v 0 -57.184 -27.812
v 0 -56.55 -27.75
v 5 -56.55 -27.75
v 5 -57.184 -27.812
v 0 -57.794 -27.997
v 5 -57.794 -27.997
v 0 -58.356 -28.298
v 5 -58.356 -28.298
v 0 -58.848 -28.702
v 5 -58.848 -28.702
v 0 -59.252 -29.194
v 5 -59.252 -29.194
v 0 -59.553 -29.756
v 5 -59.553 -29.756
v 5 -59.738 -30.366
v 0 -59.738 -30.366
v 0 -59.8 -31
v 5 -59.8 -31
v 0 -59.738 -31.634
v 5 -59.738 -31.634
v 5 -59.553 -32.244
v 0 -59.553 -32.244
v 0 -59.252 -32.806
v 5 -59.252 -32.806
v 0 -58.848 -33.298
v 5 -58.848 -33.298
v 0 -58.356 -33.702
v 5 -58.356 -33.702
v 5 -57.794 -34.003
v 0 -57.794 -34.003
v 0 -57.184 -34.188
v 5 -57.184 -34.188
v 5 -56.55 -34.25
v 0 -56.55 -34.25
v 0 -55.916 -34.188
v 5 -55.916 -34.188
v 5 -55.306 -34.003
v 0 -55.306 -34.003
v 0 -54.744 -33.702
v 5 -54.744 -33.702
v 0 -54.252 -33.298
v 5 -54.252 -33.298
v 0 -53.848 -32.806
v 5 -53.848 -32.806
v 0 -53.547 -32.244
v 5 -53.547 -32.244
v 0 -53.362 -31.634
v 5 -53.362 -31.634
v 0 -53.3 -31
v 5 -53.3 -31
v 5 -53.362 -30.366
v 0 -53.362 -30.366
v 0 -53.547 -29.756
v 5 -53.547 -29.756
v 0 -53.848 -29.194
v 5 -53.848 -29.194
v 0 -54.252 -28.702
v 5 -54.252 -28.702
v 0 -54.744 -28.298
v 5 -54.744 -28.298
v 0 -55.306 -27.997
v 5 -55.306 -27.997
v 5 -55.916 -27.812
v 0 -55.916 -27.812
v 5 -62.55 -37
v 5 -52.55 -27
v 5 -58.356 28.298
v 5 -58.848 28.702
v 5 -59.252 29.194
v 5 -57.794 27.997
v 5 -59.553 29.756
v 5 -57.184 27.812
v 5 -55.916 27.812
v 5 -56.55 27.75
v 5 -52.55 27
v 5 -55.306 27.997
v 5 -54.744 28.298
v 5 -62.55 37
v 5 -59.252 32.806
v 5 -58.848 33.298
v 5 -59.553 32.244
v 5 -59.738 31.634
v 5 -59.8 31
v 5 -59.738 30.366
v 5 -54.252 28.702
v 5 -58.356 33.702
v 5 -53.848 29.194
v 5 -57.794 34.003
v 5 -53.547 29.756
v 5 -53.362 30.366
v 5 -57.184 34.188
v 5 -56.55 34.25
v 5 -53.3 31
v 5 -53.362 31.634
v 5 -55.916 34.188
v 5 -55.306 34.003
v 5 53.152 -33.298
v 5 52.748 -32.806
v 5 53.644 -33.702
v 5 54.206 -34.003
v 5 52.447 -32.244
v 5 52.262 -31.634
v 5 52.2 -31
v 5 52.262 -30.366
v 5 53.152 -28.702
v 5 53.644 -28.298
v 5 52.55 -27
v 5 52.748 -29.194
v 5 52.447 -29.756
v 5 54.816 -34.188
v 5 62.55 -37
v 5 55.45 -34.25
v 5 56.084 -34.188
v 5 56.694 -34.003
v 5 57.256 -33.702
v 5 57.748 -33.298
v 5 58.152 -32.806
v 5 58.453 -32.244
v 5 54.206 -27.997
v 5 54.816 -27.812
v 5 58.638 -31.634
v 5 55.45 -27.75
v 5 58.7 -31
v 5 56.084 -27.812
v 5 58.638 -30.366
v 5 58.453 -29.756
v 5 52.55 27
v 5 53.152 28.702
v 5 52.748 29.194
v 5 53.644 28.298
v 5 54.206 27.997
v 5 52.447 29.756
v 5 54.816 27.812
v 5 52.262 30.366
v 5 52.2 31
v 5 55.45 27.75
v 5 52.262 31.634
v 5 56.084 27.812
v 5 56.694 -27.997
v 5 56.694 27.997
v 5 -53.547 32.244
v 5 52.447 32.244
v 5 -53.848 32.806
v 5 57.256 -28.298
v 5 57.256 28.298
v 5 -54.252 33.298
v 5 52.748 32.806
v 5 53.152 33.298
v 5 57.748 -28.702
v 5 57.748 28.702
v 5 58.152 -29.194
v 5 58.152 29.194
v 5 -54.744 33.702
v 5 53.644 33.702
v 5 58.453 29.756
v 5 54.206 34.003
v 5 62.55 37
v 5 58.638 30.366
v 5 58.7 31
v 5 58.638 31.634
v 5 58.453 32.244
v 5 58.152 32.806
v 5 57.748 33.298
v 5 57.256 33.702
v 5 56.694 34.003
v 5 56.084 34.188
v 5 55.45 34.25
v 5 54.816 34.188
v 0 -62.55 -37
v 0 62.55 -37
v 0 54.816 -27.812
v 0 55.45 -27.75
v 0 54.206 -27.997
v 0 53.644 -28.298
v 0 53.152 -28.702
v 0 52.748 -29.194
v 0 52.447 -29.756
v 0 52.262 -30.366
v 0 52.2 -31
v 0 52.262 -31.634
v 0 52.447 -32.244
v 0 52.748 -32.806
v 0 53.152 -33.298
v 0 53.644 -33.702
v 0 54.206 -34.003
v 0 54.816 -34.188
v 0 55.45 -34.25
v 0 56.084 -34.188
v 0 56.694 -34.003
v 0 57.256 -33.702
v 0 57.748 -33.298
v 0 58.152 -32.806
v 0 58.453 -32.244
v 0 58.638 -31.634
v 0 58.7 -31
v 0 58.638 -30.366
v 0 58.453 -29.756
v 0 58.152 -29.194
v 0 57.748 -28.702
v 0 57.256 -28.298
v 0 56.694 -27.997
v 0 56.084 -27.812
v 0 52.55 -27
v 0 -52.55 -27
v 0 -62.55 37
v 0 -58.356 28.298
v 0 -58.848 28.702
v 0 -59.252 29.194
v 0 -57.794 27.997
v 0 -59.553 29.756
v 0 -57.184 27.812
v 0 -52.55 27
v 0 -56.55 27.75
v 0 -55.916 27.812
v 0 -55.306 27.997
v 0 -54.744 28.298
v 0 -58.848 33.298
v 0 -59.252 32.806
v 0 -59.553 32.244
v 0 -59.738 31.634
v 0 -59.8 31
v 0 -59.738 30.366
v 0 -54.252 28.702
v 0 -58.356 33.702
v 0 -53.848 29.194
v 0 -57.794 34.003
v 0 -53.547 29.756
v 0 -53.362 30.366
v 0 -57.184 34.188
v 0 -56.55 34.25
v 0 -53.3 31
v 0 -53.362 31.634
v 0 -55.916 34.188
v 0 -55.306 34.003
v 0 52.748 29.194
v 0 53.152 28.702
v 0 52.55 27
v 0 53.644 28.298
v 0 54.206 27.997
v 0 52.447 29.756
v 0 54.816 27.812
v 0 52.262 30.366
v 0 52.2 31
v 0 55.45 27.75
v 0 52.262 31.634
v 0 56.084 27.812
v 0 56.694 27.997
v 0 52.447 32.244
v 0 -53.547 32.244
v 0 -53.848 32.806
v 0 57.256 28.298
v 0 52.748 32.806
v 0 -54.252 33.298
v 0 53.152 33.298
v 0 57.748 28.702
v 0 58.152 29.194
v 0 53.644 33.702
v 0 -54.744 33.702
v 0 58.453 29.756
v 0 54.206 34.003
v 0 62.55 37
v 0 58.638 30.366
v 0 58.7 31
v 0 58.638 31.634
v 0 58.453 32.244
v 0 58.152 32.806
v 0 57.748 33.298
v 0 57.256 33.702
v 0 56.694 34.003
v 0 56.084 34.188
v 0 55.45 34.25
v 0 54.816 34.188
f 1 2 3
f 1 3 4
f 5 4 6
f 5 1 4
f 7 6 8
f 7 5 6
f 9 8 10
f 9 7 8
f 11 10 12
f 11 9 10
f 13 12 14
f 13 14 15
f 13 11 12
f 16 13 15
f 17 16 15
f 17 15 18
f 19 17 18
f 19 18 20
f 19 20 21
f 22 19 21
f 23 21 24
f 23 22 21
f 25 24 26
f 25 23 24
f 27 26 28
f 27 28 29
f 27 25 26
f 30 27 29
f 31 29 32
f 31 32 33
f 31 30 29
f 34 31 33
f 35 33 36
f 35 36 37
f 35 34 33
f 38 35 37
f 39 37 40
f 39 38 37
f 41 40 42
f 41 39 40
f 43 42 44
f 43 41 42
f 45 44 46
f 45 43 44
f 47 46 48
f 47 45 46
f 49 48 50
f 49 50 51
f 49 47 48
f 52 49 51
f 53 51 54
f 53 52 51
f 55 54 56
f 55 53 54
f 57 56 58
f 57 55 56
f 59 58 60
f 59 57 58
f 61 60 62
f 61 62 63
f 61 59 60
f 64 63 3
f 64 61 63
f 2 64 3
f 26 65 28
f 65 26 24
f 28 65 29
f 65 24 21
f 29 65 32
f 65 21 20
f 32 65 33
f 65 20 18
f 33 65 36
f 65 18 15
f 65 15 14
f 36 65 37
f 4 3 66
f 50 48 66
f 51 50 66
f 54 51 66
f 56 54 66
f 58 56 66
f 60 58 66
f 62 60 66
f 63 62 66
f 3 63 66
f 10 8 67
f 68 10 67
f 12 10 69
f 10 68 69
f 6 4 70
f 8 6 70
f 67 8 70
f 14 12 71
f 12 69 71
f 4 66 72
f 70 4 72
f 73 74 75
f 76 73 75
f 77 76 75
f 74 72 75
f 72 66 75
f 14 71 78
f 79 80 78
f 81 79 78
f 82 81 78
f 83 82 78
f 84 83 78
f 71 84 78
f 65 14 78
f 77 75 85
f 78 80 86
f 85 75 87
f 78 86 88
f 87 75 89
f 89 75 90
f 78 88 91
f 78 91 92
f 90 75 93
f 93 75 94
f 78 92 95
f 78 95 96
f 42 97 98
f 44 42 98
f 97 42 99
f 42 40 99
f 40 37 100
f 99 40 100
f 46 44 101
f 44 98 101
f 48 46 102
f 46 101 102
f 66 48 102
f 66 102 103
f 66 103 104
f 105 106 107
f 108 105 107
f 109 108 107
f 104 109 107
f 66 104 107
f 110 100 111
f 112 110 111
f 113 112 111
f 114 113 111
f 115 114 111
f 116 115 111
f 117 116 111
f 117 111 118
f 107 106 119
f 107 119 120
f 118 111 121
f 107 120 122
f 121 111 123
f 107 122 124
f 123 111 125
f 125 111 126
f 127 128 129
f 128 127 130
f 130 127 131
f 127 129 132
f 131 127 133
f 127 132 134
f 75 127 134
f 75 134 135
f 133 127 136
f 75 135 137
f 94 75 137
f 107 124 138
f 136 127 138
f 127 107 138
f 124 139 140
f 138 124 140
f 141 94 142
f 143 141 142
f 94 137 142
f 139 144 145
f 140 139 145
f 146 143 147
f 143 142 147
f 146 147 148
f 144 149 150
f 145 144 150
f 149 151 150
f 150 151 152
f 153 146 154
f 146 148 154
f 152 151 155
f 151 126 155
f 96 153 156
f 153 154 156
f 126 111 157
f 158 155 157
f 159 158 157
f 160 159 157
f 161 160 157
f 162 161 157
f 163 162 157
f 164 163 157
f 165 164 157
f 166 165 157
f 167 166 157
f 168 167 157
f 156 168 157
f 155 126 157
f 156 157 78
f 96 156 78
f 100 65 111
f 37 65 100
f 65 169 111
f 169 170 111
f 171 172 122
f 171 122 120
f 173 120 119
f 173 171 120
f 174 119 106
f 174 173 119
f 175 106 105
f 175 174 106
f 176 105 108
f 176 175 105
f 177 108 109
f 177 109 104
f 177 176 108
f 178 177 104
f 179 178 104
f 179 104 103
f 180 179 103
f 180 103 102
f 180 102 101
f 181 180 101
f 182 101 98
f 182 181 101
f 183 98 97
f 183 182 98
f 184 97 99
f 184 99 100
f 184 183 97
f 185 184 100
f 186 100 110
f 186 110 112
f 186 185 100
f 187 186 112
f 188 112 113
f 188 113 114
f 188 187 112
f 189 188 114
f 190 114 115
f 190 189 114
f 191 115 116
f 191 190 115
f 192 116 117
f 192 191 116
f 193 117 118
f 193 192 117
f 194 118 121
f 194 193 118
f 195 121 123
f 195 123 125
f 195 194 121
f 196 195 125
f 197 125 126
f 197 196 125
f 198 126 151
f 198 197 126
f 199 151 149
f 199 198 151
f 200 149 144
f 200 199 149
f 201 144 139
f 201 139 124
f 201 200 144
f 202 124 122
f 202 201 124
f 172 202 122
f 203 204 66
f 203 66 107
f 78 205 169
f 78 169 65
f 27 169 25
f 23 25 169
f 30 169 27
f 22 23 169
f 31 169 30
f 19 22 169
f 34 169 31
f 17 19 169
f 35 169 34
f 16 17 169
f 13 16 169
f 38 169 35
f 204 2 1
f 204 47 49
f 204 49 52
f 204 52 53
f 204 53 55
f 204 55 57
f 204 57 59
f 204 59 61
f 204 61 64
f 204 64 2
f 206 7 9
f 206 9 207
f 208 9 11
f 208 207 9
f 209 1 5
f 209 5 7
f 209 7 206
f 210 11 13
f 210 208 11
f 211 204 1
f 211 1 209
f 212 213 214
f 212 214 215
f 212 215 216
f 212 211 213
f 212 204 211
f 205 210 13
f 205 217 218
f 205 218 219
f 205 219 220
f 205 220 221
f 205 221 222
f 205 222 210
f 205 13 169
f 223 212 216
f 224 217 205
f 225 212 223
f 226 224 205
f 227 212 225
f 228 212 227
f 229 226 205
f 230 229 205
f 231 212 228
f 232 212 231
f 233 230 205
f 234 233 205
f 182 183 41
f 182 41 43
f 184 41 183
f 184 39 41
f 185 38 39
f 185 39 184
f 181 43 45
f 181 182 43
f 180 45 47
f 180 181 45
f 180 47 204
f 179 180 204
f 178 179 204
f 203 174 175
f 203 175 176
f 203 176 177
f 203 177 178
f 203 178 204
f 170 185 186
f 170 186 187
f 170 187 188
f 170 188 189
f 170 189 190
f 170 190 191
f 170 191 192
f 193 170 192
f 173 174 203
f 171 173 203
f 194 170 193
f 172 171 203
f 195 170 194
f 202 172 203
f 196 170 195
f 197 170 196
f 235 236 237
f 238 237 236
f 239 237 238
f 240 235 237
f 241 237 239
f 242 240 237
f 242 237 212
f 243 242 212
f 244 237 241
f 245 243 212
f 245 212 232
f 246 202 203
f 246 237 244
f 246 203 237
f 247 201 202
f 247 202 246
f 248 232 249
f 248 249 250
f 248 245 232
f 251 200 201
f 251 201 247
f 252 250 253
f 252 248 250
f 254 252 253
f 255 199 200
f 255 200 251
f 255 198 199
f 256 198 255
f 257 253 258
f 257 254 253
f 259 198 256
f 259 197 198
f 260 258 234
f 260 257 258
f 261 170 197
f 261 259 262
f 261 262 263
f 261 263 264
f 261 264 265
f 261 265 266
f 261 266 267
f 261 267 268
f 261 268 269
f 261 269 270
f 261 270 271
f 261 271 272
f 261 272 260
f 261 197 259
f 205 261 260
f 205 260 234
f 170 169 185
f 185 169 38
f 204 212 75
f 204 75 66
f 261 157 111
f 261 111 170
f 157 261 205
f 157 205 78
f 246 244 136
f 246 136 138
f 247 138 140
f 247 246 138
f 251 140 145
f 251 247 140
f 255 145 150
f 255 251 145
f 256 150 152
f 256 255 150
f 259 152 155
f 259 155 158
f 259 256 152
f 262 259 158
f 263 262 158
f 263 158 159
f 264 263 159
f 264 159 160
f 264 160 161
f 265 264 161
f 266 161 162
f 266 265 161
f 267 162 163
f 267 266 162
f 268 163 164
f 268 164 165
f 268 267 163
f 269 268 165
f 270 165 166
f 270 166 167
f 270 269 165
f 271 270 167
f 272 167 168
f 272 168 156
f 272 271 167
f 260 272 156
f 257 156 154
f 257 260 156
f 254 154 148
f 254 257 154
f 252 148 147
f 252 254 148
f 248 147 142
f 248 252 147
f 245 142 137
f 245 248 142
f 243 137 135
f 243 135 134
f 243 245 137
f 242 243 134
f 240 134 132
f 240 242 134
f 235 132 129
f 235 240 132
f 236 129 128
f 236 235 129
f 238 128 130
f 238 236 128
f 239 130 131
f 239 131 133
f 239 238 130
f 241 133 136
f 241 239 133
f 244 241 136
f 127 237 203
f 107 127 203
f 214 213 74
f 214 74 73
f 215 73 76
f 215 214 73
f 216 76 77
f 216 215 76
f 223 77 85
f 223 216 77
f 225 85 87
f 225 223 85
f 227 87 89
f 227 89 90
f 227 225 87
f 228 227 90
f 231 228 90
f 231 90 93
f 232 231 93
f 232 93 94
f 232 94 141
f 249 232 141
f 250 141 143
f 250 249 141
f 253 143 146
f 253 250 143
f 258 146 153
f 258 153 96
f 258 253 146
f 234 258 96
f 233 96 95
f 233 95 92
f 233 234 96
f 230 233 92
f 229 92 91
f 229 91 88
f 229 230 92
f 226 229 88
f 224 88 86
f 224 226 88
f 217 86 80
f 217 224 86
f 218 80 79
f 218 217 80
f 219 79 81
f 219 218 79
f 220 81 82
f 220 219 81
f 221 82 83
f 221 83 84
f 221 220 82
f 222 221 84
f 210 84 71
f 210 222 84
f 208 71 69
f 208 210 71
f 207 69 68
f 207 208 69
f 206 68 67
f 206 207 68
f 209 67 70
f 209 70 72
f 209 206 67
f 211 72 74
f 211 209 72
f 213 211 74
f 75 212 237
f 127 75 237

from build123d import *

# Parameters (mm, degrees)
SKETCH1_W           = 70
SKETCH1_H           = 121.1
SKETCH1_R           = 3.25
SKETCH1_W_2         = 54
SKETCH1_H_2         = 105.1
BOSS_EXTRUDE1_DEPTH = 5
SKETCH2_W           = 5
SKETCH2_H           = 121.1
BOSS_EXTRUDE2_DEPTH = 2
SKETCH3_W           = 5
SKETCH3_H           = 72
BOSS_EXTRUDE3_DEPTH = 2
SKETCH4_W           = 5
SKETCH4_H           = 123.1
BOSS_EXTRUDE4_DEPTH = 2
SKETCH5_W           = 5
SKETCH5_H           = 74
BOSS_EXTRUDE5_DEPTH = 2


with BuildPart() as part:
    # Sketch1 → Boss-Extrude1 (new body)
    with BuildSketch(Plane(origin=(0, 0, 0), x_dir=(0, 0, -1), z_dir=(1, 0, 0))):
        Rectangle(SKETCH1_W, SKETCH1_H)
        with Locations((-31, -56.55)):
            Circle(SKETCH1_R, mode=Mode.SUBTRACT)
        with Locations(Location((31, -56.55, 0), (0, 0, 180))):
            Circle(SKETCH1_R, mode=Mode.SUBTRACT)
        with Locations((-31, 55.45)):
            Circle(SKETCH1_R, mode=Mode.SUBTRACT)
        with Locations(Location((31, 55.45, 0), (0, 0, 180))):
            Circle(SKETCH1_R, mode=Mode.SUBTRACT)
        Rectangle(SKETCH1_W_2, SKETCH1_H_2, mode=Mode.SUBTRACT)
    extrude(amount=BOSS_EXTRUDE1_DEPTH)

    # Sketch2 → Boss-Extrude2 (add)
    with BuildSketch(Plane.XY.offset(35)):
        with Locations((2.5, 0)):
            Rectangle(SKETCH2_W, SKETCH2_H)
    extrude(amount=BOSS_EXTRUDE2_DEPTH)

    # Sketch3 → Boss-Extrude3 (add)
    with BuildSketch(Plane(origin=(0, 60.55, 0), x_dir=(1, 0, 0), z_dir=(0, 1, 0))):
        with Locations((2.5, -1)):
            Rectangle(SKETCH3_W, SKETCH3_H)
    extrude(amount=BOSS_EXTRUDE3_DEPTH)

    # Sketch4 → Boss-Extrude4 (add)
    with BuildSketch(Plane(origin=(0, 0, -35), x_dir=(-1, 0, 0), z_dir=(0, 0, -1))):
        with Locations((-2.5, 1)):
            Rectangle(SKETCH4_W, SKETCH4_H)
    extrude(amount=BOSS_EXTRUDE4_DEPTH)

    # Sketch5 → Boss-Extrude5 (add)
    with BuildSketch(Plane.XZ.offset(60.55)):
        with Locations((2.5, 0)):
            Rectangle(SKETCH5_W, SKETCH5_H)
    extrude(amount=BOSS_EXTRUDE5_DEPTH)


solid = part.part
